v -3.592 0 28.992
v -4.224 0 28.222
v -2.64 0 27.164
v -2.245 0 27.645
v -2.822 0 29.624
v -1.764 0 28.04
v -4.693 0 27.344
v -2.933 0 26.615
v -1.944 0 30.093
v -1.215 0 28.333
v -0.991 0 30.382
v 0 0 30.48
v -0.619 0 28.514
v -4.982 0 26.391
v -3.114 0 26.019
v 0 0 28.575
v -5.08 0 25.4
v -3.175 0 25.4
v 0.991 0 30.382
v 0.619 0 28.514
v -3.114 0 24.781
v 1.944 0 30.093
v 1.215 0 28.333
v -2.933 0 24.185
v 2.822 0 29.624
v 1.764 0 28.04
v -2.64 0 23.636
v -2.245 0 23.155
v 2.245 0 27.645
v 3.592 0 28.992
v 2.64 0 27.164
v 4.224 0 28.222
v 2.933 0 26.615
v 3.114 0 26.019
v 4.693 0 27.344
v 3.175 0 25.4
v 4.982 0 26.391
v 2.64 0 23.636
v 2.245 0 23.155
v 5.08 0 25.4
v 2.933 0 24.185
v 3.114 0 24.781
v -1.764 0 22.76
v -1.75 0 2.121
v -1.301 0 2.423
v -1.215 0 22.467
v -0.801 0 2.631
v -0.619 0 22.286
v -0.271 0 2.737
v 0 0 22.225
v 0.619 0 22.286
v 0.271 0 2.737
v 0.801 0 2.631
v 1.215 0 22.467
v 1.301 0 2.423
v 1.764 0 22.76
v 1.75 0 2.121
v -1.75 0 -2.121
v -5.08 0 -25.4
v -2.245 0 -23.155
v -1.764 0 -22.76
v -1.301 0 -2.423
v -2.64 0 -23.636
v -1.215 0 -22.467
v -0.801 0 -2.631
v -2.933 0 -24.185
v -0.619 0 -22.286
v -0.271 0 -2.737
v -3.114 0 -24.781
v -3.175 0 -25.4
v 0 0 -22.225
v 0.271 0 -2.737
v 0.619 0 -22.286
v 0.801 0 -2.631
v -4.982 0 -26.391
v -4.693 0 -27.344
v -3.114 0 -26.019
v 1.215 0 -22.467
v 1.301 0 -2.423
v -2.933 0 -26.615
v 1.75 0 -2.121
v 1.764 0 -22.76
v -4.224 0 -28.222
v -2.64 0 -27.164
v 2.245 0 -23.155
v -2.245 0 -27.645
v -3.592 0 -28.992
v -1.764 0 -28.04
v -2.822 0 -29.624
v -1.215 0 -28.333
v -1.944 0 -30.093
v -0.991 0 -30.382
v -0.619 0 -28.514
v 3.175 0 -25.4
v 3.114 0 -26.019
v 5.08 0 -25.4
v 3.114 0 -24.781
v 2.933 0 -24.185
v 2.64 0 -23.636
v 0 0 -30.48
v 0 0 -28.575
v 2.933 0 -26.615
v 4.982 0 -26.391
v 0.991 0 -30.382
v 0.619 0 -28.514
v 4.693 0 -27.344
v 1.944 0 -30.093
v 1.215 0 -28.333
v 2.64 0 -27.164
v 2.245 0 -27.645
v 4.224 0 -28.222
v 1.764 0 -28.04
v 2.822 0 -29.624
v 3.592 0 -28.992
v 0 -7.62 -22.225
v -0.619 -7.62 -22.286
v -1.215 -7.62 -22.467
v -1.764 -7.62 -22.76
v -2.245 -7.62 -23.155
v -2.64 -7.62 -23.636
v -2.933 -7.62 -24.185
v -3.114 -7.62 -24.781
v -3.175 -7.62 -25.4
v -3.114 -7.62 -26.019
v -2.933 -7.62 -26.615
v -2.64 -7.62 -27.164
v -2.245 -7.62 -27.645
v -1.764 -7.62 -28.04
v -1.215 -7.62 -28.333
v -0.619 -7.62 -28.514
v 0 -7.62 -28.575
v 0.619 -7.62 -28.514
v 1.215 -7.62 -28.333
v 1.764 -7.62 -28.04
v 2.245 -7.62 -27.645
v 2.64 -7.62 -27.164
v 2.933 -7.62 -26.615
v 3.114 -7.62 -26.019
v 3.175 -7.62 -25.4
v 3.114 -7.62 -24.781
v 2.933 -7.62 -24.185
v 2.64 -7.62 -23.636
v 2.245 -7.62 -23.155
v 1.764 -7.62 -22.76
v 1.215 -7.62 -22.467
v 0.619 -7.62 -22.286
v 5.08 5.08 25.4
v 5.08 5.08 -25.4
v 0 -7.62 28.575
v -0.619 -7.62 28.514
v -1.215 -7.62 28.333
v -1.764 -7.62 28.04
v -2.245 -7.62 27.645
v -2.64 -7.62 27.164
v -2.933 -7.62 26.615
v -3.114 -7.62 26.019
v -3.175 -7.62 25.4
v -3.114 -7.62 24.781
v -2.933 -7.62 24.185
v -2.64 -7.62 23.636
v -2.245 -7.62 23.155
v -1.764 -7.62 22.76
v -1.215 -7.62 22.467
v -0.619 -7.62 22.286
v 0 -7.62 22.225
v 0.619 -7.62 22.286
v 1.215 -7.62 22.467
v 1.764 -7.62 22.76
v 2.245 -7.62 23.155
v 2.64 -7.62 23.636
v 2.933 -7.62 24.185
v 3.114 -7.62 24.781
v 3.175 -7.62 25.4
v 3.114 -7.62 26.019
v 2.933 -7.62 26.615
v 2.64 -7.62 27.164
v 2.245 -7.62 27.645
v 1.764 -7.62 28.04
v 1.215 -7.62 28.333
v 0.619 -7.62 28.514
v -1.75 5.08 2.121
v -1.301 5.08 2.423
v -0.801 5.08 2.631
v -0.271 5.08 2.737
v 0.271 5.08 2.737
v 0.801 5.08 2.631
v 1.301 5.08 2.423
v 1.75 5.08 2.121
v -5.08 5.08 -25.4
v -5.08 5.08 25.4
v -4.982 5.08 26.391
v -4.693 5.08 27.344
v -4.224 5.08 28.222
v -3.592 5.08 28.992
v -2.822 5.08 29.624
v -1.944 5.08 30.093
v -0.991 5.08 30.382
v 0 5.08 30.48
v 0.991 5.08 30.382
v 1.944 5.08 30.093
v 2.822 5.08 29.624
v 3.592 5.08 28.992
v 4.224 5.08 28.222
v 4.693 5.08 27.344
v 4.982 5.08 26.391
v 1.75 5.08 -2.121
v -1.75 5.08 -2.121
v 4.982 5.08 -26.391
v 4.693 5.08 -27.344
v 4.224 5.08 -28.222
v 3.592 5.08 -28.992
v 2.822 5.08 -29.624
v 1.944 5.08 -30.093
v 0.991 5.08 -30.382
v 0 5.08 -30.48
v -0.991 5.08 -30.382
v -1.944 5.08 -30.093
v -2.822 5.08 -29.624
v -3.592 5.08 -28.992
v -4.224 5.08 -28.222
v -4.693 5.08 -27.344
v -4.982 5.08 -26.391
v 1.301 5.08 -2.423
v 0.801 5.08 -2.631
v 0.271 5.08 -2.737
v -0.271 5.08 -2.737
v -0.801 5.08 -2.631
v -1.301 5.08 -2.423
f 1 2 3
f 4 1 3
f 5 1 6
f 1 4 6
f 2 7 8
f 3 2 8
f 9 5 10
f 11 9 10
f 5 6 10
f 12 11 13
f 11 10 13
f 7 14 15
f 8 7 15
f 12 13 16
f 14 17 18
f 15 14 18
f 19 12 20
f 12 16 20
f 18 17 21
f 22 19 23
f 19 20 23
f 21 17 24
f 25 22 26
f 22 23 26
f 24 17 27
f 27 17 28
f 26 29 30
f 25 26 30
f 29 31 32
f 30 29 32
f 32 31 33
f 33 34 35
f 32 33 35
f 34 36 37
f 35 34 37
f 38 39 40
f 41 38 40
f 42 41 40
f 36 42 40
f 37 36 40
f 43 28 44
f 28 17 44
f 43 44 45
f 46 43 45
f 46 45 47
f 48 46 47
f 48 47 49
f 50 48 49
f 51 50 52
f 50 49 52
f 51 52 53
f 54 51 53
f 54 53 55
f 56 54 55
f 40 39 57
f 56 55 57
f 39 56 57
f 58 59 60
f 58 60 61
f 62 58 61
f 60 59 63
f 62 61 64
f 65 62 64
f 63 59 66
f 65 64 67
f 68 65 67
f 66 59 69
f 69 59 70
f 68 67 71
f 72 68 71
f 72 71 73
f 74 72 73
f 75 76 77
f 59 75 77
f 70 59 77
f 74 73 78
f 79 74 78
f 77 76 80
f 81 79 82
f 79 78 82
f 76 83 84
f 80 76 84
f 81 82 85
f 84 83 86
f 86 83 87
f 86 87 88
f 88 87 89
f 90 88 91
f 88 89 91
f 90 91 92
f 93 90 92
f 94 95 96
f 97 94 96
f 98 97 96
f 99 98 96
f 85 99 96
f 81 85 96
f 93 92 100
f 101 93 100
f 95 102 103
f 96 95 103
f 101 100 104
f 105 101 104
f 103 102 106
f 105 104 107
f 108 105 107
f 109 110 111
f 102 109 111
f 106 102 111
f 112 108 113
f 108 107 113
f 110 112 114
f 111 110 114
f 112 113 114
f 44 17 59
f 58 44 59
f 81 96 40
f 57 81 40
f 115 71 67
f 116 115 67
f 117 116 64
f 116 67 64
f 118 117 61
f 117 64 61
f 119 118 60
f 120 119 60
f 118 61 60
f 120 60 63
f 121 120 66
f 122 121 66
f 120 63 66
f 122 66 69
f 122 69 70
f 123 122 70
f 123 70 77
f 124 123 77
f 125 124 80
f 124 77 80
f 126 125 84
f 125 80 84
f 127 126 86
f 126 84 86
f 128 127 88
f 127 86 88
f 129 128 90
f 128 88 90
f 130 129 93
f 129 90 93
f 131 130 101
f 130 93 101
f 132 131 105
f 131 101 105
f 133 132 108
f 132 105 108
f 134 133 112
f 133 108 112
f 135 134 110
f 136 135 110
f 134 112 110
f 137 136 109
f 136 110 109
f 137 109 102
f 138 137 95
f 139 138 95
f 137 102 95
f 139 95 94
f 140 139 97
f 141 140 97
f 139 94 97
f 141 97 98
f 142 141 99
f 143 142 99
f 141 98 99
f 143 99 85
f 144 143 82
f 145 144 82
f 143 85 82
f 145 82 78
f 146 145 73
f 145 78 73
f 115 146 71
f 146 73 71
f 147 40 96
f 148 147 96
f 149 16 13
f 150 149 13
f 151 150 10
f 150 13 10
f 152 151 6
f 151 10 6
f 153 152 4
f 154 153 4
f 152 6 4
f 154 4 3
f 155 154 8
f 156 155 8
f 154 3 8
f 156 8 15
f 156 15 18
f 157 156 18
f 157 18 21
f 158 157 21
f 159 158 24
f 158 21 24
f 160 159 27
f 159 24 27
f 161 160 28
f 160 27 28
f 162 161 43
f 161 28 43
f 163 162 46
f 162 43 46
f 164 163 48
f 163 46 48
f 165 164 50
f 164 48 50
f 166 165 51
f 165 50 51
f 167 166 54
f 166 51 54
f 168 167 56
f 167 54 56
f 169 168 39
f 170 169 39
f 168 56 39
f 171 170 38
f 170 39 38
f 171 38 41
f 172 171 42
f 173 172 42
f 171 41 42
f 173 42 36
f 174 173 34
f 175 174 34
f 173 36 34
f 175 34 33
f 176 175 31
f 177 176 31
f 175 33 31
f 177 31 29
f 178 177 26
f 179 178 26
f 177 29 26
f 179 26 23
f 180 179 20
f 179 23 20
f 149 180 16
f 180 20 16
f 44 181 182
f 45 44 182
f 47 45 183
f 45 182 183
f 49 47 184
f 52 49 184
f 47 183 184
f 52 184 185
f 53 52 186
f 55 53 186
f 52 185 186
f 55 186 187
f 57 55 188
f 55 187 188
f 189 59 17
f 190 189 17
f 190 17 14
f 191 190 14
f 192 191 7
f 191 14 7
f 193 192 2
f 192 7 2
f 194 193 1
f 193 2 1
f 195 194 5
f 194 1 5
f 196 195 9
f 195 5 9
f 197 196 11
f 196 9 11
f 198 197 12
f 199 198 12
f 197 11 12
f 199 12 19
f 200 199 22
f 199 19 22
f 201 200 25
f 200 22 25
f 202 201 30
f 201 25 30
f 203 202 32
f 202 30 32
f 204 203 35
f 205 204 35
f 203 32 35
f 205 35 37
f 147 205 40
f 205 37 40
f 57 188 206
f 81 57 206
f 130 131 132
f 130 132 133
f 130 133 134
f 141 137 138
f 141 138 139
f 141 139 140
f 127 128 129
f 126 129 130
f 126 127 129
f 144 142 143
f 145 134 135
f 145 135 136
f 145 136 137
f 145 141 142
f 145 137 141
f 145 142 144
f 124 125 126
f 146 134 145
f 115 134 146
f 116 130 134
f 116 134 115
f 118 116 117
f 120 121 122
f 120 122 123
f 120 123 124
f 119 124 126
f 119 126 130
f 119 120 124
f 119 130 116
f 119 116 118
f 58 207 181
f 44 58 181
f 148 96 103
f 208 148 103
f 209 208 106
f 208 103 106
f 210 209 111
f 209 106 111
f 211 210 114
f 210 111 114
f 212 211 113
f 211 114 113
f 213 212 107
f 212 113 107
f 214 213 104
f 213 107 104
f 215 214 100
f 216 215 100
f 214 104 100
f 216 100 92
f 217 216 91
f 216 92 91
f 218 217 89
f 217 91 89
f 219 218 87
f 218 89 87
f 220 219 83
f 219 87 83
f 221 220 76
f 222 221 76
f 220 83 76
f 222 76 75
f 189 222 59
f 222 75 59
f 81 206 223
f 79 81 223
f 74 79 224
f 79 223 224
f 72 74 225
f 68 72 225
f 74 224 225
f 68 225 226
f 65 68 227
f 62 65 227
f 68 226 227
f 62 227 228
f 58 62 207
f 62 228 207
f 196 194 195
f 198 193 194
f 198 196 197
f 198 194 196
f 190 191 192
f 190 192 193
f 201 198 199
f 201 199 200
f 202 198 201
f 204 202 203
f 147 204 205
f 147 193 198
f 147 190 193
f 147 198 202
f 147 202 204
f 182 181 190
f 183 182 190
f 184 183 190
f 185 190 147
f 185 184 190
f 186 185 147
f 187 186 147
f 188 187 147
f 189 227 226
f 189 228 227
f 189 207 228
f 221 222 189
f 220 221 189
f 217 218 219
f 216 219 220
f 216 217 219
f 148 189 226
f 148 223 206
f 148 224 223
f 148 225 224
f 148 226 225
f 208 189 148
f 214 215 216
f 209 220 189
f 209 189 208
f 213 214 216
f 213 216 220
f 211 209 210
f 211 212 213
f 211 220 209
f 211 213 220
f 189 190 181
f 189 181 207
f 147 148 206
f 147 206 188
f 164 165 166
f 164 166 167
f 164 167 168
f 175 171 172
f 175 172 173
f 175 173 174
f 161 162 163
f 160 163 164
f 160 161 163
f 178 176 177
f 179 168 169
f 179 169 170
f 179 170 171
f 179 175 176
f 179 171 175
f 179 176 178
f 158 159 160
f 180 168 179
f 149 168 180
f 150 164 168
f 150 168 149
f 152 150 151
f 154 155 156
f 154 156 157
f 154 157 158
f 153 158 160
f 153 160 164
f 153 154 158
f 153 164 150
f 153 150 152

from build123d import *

# Parameters (mm, degrees)
BOSS_EXTRUDE1_DEPTH = 5.08
SKETCH3_R           = 3.175
BOSS_EXTRUDE2_DEPTH = 7.62
CUT_EXTRUDE1_REACH  = 35.408


with BuildPart() as part:
    # Sketch2 → Boss-Extrude1 (new body)
    with BuildSketch(Plane(origin=(0, 0, 0), x_dir=(1, 0, 0), z_dir=(0, 1, 0))):
        with BuildLine():
            Line((-5.08, 25.4), (-5.08, -25.4))
            ThreePointArc((-5.08, -25.4), (0, -30.48), (5.08, -25.4))
            Line((5.08, -25.4), (5.08, 25.4))
            ThreePointArc((5.08, 25.4), (0, 30.48), (-5.08, 25.4))
        make_face()
    extrude(amount=BOSS_EXTRUDE1_DEPTH)

    # Sketch3 → Boss-Extrude2 (add)
    with BuildSketch(Plane(origin=(0, 0, 0), x_dir=(-1, 0, 0), z_dir=(0, -1, 0))):
        with Locations(Location((0, -25.4, 0), (0, 0, 270))):
            Circle(SKETCH3_R)
        with Locations(Location((0, 25.4, 0), (0, 0, 270))):
            Circle(SKETCH3_R)
    extrude(amount=BOSS_EXTRUDE2_DEPTH)

    # Sketch10 → Cut-Extrude1 (cut, up to next)
    with BuildSketch(Plane(origin=(0, 5.08, 0), x_dir=(1, 0, 0), z_dir=(0, 1, 0)), mode=Mode.PRIVATE) as cut_extrude1_sk1:
        with BuildLine():
            Line((-1.75, 2.121320344), (-1.75, -2.121320344))
            ThreePointArc((-1.75, -2.121320344), (0, -2.75), (1.75, -2.121320344))
            Line((1.75, -2.121320344), (1.75, 2.121320344))
            ThreePointArc((1.75, 2.121320344), (0, 2.75), (-1.75, 2.121320344))
        make_face()
    cut_extrude1_tool1 = extrude(cut_extrude1_sk1.sketch, amount=-CUT_EXTRUDE1_REACH, mode=Mode.PRIVATE) & part.part
    add(cut_extrude1_tool1.solids().sort_by_distance((0, 5.08, 0))[0], mode=Mode.SUBTRACT)


solid = part.part
